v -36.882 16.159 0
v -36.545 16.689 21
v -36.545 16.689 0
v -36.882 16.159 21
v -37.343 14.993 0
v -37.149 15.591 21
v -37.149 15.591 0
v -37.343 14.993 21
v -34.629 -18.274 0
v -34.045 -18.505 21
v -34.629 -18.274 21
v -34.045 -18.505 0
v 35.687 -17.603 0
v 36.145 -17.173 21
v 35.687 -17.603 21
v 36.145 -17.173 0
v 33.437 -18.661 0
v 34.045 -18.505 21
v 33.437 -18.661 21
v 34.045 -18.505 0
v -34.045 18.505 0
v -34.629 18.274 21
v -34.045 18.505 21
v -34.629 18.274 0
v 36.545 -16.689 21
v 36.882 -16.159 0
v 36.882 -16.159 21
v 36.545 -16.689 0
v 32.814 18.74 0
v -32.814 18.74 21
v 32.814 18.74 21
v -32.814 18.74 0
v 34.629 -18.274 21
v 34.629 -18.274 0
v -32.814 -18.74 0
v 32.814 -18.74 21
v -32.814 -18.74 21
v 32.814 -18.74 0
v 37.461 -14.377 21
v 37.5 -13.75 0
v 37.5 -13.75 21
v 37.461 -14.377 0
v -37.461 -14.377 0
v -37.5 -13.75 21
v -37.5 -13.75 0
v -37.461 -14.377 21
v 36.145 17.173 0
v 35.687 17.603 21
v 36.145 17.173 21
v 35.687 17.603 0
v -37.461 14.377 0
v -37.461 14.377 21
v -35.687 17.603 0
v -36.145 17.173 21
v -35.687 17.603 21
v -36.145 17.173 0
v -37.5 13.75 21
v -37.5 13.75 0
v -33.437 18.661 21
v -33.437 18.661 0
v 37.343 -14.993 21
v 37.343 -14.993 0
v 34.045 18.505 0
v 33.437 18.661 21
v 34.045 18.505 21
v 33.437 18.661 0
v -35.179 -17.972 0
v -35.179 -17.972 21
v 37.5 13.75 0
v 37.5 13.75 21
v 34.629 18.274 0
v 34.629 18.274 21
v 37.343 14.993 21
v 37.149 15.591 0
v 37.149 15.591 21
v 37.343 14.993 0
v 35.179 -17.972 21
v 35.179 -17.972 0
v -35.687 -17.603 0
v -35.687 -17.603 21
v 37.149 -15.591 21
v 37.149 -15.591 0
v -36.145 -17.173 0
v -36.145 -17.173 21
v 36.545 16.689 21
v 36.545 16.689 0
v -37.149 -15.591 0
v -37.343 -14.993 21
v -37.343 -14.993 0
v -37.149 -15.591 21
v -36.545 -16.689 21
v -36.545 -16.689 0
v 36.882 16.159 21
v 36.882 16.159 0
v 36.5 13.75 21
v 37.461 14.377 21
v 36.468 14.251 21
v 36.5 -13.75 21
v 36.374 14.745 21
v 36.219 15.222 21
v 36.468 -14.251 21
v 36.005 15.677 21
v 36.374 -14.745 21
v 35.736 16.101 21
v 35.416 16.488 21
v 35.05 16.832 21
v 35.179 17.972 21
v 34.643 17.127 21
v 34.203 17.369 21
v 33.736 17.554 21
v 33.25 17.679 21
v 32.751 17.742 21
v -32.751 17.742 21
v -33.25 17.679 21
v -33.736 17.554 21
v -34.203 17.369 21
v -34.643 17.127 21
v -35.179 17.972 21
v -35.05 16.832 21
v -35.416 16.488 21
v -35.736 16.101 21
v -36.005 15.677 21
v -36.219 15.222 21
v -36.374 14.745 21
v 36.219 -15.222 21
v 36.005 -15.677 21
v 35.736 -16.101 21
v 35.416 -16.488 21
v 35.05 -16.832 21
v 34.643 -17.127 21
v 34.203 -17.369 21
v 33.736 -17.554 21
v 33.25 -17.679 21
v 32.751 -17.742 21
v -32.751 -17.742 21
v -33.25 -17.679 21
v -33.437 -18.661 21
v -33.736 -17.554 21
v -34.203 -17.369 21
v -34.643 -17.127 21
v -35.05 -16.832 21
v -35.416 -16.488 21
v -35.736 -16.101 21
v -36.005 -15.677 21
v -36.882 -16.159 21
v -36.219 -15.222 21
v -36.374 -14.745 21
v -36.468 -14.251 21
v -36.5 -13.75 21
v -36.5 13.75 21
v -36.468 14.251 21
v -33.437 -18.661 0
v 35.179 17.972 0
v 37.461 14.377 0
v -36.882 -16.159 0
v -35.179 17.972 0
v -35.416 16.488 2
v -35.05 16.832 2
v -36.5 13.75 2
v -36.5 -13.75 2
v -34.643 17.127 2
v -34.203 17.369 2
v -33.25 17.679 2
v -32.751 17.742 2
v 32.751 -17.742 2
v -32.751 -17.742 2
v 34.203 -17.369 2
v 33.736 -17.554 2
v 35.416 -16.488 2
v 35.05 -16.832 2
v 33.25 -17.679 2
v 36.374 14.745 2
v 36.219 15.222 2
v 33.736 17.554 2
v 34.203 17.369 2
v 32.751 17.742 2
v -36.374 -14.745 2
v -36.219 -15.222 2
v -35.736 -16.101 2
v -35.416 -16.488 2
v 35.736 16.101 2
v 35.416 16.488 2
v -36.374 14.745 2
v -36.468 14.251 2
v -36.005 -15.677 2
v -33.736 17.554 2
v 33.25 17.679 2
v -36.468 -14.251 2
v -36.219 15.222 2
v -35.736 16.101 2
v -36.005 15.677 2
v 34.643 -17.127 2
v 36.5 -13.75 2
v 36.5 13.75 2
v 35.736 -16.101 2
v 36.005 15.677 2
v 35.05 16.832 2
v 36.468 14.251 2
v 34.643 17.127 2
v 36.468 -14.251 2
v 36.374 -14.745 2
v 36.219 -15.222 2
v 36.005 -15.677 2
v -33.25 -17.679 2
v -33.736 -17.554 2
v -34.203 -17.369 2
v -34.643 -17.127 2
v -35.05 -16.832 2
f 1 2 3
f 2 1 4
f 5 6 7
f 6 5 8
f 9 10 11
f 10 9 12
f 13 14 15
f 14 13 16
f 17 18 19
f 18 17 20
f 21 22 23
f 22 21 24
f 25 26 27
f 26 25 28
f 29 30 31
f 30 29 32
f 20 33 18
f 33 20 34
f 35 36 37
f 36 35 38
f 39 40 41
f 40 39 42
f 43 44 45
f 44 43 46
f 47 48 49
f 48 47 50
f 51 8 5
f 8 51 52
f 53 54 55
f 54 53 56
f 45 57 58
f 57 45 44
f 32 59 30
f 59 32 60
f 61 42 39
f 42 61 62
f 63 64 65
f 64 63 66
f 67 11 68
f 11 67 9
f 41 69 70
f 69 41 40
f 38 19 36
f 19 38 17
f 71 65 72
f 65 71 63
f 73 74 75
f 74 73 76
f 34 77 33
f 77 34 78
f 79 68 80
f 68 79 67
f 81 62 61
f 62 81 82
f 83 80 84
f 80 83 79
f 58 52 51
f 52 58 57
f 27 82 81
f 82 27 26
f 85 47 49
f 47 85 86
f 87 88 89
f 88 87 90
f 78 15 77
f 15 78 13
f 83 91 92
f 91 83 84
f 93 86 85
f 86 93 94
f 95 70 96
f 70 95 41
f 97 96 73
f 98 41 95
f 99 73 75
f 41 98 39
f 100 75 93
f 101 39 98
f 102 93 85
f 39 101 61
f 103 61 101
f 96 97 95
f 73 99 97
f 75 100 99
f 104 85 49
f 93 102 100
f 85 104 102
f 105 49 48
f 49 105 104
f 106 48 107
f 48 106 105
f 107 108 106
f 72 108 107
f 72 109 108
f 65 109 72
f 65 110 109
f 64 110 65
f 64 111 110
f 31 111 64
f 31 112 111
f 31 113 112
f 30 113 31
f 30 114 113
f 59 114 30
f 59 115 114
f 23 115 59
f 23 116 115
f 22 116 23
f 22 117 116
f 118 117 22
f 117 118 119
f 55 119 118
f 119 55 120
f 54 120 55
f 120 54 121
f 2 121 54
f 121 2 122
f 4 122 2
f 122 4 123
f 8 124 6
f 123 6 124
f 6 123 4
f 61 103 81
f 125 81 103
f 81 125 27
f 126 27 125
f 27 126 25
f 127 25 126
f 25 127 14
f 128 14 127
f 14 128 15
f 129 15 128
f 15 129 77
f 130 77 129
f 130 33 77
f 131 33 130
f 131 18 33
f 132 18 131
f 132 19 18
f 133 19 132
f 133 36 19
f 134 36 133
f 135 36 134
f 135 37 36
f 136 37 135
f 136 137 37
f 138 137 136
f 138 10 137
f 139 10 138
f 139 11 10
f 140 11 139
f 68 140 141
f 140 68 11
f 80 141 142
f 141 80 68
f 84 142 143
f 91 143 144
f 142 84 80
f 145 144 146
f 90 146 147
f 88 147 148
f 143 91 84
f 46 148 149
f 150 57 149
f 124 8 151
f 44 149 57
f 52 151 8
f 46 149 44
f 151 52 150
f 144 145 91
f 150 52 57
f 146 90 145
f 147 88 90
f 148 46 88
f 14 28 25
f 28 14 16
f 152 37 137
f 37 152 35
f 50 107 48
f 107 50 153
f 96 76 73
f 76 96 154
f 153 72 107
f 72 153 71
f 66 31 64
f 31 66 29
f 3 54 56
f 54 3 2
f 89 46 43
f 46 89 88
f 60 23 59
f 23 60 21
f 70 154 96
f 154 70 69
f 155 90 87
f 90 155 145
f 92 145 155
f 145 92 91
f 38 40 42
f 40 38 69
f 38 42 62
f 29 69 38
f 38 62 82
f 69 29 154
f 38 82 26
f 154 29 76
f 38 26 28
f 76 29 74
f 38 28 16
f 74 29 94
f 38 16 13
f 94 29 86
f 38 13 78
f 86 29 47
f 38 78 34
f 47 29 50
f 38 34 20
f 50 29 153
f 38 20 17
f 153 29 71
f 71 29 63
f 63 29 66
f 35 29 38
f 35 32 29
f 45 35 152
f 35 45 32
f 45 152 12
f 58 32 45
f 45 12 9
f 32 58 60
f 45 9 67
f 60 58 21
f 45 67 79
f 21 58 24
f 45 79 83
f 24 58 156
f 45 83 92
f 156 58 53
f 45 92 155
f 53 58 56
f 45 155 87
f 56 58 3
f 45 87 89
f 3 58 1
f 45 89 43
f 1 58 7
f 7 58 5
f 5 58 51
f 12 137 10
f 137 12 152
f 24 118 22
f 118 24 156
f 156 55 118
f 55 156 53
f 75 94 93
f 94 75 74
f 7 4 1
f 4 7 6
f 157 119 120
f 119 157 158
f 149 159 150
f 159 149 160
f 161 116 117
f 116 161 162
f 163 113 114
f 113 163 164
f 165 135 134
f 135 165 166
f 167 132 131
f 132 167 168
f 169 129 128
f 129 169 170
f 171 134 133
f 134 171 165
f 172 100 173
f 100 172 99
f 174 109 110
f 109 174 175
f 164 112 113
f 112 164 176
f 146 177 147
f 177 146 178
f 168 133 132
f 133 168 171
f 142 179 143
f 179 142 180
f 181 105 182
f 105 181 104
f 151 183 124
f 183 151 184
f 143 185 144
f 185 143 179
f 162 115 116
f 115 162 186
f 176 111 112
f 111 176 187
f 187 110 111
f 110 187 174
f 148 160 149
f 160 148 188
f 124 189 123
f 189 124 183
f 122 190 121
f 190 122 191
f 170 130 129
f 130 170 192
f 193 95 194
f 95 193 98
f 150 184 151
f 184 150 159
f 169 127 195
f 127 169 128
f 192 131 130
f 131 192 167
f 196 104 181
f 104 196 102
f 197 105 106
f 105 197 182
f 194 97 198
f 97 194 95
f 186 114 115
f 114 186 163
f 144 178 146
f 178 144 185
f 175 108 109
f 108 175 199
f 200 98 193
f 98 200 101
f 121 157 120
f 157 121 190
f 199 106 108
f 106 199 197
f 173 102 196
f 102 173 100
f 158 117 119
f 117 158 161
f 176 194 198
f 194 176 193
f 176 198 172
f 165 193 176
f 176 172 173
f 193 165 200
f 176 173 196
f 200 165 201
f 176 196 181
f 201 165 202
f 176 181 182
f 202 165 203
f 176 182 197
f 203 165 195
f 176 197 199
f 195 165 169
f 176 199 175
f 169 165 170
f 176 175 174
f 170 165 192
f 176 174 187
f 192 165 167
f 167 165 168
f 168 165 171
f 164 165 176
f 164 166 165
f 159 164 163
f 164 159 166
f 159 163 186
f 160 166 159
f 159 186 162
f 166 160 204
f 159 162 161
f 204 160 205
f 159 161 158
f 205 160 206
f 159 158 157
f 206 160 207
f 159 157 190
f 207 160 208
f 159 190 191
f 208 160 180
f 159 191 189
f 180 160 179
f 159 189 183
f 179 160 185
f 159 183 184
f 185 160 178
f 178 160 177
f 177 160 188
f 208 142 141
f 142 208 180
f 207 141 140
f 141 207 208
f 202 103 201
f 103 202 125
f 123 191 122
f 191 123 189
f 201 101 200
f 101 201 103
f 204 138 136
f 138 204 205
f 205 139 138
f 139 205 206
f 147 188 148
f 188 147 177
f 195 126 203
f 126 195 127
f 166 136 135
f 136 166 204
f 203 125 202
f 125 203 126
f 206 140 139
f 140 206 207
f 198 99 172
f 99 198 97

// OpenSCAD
$fn = 50;


difference() {
	union() {
		hull() {
			translate(v = [-32.5000000000, 13.7500000000, 0]) {
				cylinder(h = 21, r = 5);
			}
			translate(v = [32.5000000000, 13.7500000000, 0]) {
				cylinder(h = 21, r = 5);
			}
			translate(v = [-32.5000000000, -13.7500000000, 0]) {
				cylinder(h = 21, r = 5);
			}
			translate(v = [32.5000000000, -13.7500000000, 0]) {
				cylinder(h = 21, r = 5);
			}
		}
	}
	union() {
		translate(v = [0, 0, 2]) {
			#hull() {
				translate(v = [-32.5000000000, 13.7500000000, 0]) {
					cylinder(h = 19, r = 4);
				}
				translate(v = [32.5000000000, 13.7500000000, 0]) {
					cylinder(h = 19, r = 4);
				}
				translate(v = [-32.5000000000, -13.7500000000, 0]) {
					cylinder(h = 19, r = 4);
				}
				translate(v = [32.5000000000, -13.7500000000, 0]) {
					cylinder(h = 19, r = 4);
				}
			}
		}
	}
}
